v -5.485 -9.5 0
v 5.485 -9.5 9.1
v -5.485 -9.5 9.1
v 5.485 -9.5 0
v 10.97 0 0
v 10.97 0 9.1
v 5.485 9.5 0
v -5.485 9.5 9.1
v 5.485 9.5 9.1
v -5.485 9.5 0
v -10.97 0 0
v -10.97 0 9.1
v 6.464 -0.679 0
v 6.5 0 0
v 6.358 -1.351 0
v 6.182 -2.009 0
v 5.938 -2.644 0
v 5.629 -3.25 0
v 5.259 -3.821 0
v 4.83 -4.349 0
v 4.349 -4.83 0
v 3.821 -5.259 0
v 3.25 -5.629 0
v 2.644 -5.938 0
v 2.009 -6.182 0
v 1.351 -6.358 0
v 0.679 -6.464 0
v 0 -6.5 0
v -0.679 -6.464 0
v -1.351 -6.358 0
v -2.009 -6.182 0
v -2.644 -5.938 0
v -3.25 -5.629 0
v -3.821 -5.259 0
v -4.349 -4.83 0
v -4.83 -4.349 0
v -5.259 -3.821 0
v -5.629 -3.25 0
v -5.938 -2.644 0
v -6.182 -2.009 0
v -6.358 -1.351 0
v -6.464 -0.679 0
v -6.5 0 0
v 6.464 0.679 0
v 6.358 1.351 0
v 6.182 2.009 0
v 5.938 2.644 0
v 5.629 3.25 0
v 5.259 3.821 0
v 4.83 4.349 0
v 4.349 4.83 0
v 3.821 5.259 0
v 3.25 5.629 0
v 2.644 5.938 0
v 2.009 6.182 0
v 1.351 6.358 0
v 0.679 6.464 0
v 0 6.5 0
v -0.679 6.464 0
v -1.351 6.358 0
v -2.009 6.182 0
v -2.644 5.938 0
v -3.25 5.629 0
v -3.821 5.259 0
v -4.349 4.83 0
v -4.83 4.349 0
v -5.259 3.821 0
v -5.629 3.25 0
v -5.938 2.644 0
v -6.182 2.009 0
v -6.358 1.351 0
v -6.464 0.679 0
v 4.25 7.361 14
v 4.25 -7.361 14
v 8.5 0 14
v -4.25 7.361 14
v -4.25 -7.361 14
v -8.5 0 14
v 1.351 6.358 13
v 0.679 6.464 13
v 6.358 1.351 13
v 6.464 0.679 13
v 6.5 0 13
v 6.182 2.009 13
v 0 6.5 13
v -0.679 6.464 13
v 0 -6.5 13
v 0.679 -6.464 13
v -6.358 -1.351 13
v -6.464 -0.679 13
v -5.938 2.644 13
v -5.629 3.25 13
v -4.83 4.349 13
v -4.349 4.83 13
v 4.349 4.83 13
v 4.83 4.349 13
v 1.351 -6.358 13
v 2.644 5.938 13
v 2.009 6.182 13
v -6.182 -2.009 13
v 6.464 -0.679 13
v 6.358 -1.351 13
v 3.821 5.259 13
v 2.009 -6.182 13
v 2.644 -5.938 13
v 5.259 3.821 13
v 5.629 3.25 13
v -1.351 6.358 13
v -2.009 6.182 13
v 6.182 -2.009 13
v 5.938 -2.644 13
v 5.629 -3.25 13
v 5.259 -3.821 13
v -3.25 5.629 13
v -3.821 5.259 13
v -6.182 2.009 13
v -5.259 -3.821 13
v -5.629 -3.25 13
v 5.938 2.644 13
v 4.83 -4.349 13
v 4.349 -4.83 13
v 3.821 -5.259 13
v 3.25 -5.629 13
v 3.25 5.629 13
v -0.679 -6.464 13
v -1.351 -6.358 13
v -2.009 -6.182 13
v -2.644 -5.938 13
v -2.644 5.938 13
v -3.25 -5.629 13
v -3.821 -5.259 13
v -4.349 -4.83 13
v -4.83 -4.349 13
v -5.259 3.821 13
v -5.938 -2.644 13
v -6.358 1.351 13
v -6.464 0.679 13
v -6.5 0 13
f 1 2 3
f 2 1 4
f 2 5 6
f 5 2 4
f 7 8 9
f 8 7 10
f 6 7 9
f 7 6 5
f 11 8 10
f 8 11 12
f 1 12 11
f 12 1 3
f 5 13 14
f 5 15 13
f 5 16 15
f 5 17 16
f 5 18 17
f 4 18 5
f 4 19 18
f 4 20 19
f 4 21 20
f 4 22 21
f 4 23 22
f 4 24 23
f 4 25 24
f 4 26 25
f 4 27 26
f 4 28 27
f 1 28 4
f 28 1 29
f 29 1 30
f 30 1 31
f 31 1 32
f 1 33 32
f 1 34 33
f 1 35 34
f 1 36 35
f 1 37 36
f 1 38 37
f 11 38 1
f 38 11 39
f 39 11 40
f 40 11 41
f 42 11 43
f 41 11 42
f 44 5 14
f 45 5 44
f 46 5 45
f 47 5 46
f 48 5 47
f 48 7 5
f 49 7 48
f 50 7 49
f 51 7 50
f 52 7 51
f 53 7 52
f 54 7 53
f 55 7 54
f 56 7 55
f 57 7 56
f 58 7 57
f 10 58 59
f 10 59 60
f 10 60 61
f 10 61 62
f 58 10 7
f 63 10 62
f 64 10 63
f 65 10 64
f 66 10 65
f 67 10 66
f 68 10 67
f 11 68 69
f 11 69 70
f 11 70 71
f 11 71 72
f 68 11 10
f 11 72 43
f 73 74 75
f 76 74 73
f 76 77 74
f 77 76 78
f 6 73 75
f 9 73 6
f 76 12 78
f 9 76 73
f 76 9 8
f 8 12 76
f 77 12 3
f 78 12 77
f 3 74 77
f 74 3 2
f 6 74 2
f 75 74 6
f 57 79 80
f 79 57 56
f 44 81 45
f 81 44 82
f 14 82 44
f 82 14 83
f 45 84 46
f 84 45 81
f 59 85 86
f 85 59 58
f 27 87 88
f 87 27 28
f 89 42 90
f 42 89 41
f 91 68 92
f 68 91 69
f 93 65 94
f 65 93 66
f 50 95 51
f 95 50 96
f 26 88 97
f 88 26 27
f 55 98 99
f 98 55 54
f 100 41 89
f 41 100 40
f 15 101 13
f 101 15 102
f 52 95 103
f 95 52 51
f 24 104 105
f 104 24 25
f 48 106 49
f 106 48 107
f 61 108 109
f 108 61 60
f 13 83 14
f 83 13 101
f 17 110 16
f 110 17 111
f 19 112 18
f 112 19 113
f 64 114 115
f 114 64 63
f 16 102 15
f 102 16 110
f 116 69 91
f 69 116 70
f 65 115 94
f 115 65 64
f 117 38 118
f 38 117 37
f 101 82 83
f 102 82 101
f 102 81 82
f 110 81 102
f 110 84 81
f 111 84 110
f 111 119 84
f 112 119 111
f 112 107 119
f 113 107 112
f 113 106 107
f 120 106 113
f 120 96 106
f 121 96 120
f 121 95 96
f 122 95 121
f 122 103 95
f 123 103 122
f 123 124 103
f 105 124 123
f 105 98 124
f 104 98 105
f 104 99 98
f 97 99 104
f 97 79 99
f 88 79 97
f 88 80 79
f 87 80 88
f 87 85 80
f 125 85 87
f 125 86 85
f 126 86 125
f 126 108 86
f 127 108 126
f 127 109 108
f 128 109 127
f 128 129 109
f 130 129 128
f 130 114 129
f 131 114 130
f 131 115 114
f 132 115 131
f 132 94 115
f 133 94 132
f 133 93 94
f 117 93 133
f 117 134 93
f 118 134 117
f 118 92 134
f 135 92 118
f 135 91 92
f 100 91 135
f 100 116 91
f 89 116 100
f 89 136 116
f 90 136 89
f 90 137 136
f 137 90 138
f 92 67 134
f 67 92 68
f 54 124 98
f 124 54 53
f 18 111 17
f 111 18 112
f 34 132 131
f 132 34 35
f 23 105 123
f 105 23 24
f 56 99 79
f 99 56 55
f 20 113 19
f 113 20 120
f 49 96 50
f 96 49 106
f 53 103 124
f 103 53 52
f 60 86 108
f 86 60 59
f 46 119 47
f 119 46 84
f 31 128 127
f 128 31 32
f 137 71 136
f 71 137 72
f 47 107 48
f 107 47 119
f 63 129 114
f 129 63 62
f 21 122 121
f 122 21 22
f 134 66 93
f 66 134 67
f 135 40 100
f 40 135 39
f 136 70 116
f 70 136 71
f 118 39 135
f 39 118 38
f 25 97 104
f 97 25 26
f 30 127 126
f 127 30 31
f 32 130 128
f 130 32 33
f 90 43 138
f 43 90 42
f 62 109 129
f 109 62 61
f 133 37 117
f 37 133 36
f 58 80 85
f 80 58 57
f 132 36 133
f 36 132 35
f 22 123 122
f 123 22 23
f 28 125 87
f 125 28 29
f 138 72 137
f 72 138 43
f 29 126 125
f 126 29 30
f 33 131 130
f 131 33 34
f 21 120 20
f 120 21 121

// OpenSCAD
// Blind cap nut.
$fn = 60;
eps = 0.02;
thread_d = 13;
flat = 19;
height = 14;
body_h = height*0.65;
difference() {
    union() {
        cylinder(d=flat/cos(30),h=body_h,$fn=6);
        translate([0,0,body_h]) cylinder(d1=flat/cos(30),d2=thread_d+4,h=height-body_h,$fn=6);
    }
    translate([0,0,-eps]) cylinder(d=thread_d,h=height-1+eps);
}
